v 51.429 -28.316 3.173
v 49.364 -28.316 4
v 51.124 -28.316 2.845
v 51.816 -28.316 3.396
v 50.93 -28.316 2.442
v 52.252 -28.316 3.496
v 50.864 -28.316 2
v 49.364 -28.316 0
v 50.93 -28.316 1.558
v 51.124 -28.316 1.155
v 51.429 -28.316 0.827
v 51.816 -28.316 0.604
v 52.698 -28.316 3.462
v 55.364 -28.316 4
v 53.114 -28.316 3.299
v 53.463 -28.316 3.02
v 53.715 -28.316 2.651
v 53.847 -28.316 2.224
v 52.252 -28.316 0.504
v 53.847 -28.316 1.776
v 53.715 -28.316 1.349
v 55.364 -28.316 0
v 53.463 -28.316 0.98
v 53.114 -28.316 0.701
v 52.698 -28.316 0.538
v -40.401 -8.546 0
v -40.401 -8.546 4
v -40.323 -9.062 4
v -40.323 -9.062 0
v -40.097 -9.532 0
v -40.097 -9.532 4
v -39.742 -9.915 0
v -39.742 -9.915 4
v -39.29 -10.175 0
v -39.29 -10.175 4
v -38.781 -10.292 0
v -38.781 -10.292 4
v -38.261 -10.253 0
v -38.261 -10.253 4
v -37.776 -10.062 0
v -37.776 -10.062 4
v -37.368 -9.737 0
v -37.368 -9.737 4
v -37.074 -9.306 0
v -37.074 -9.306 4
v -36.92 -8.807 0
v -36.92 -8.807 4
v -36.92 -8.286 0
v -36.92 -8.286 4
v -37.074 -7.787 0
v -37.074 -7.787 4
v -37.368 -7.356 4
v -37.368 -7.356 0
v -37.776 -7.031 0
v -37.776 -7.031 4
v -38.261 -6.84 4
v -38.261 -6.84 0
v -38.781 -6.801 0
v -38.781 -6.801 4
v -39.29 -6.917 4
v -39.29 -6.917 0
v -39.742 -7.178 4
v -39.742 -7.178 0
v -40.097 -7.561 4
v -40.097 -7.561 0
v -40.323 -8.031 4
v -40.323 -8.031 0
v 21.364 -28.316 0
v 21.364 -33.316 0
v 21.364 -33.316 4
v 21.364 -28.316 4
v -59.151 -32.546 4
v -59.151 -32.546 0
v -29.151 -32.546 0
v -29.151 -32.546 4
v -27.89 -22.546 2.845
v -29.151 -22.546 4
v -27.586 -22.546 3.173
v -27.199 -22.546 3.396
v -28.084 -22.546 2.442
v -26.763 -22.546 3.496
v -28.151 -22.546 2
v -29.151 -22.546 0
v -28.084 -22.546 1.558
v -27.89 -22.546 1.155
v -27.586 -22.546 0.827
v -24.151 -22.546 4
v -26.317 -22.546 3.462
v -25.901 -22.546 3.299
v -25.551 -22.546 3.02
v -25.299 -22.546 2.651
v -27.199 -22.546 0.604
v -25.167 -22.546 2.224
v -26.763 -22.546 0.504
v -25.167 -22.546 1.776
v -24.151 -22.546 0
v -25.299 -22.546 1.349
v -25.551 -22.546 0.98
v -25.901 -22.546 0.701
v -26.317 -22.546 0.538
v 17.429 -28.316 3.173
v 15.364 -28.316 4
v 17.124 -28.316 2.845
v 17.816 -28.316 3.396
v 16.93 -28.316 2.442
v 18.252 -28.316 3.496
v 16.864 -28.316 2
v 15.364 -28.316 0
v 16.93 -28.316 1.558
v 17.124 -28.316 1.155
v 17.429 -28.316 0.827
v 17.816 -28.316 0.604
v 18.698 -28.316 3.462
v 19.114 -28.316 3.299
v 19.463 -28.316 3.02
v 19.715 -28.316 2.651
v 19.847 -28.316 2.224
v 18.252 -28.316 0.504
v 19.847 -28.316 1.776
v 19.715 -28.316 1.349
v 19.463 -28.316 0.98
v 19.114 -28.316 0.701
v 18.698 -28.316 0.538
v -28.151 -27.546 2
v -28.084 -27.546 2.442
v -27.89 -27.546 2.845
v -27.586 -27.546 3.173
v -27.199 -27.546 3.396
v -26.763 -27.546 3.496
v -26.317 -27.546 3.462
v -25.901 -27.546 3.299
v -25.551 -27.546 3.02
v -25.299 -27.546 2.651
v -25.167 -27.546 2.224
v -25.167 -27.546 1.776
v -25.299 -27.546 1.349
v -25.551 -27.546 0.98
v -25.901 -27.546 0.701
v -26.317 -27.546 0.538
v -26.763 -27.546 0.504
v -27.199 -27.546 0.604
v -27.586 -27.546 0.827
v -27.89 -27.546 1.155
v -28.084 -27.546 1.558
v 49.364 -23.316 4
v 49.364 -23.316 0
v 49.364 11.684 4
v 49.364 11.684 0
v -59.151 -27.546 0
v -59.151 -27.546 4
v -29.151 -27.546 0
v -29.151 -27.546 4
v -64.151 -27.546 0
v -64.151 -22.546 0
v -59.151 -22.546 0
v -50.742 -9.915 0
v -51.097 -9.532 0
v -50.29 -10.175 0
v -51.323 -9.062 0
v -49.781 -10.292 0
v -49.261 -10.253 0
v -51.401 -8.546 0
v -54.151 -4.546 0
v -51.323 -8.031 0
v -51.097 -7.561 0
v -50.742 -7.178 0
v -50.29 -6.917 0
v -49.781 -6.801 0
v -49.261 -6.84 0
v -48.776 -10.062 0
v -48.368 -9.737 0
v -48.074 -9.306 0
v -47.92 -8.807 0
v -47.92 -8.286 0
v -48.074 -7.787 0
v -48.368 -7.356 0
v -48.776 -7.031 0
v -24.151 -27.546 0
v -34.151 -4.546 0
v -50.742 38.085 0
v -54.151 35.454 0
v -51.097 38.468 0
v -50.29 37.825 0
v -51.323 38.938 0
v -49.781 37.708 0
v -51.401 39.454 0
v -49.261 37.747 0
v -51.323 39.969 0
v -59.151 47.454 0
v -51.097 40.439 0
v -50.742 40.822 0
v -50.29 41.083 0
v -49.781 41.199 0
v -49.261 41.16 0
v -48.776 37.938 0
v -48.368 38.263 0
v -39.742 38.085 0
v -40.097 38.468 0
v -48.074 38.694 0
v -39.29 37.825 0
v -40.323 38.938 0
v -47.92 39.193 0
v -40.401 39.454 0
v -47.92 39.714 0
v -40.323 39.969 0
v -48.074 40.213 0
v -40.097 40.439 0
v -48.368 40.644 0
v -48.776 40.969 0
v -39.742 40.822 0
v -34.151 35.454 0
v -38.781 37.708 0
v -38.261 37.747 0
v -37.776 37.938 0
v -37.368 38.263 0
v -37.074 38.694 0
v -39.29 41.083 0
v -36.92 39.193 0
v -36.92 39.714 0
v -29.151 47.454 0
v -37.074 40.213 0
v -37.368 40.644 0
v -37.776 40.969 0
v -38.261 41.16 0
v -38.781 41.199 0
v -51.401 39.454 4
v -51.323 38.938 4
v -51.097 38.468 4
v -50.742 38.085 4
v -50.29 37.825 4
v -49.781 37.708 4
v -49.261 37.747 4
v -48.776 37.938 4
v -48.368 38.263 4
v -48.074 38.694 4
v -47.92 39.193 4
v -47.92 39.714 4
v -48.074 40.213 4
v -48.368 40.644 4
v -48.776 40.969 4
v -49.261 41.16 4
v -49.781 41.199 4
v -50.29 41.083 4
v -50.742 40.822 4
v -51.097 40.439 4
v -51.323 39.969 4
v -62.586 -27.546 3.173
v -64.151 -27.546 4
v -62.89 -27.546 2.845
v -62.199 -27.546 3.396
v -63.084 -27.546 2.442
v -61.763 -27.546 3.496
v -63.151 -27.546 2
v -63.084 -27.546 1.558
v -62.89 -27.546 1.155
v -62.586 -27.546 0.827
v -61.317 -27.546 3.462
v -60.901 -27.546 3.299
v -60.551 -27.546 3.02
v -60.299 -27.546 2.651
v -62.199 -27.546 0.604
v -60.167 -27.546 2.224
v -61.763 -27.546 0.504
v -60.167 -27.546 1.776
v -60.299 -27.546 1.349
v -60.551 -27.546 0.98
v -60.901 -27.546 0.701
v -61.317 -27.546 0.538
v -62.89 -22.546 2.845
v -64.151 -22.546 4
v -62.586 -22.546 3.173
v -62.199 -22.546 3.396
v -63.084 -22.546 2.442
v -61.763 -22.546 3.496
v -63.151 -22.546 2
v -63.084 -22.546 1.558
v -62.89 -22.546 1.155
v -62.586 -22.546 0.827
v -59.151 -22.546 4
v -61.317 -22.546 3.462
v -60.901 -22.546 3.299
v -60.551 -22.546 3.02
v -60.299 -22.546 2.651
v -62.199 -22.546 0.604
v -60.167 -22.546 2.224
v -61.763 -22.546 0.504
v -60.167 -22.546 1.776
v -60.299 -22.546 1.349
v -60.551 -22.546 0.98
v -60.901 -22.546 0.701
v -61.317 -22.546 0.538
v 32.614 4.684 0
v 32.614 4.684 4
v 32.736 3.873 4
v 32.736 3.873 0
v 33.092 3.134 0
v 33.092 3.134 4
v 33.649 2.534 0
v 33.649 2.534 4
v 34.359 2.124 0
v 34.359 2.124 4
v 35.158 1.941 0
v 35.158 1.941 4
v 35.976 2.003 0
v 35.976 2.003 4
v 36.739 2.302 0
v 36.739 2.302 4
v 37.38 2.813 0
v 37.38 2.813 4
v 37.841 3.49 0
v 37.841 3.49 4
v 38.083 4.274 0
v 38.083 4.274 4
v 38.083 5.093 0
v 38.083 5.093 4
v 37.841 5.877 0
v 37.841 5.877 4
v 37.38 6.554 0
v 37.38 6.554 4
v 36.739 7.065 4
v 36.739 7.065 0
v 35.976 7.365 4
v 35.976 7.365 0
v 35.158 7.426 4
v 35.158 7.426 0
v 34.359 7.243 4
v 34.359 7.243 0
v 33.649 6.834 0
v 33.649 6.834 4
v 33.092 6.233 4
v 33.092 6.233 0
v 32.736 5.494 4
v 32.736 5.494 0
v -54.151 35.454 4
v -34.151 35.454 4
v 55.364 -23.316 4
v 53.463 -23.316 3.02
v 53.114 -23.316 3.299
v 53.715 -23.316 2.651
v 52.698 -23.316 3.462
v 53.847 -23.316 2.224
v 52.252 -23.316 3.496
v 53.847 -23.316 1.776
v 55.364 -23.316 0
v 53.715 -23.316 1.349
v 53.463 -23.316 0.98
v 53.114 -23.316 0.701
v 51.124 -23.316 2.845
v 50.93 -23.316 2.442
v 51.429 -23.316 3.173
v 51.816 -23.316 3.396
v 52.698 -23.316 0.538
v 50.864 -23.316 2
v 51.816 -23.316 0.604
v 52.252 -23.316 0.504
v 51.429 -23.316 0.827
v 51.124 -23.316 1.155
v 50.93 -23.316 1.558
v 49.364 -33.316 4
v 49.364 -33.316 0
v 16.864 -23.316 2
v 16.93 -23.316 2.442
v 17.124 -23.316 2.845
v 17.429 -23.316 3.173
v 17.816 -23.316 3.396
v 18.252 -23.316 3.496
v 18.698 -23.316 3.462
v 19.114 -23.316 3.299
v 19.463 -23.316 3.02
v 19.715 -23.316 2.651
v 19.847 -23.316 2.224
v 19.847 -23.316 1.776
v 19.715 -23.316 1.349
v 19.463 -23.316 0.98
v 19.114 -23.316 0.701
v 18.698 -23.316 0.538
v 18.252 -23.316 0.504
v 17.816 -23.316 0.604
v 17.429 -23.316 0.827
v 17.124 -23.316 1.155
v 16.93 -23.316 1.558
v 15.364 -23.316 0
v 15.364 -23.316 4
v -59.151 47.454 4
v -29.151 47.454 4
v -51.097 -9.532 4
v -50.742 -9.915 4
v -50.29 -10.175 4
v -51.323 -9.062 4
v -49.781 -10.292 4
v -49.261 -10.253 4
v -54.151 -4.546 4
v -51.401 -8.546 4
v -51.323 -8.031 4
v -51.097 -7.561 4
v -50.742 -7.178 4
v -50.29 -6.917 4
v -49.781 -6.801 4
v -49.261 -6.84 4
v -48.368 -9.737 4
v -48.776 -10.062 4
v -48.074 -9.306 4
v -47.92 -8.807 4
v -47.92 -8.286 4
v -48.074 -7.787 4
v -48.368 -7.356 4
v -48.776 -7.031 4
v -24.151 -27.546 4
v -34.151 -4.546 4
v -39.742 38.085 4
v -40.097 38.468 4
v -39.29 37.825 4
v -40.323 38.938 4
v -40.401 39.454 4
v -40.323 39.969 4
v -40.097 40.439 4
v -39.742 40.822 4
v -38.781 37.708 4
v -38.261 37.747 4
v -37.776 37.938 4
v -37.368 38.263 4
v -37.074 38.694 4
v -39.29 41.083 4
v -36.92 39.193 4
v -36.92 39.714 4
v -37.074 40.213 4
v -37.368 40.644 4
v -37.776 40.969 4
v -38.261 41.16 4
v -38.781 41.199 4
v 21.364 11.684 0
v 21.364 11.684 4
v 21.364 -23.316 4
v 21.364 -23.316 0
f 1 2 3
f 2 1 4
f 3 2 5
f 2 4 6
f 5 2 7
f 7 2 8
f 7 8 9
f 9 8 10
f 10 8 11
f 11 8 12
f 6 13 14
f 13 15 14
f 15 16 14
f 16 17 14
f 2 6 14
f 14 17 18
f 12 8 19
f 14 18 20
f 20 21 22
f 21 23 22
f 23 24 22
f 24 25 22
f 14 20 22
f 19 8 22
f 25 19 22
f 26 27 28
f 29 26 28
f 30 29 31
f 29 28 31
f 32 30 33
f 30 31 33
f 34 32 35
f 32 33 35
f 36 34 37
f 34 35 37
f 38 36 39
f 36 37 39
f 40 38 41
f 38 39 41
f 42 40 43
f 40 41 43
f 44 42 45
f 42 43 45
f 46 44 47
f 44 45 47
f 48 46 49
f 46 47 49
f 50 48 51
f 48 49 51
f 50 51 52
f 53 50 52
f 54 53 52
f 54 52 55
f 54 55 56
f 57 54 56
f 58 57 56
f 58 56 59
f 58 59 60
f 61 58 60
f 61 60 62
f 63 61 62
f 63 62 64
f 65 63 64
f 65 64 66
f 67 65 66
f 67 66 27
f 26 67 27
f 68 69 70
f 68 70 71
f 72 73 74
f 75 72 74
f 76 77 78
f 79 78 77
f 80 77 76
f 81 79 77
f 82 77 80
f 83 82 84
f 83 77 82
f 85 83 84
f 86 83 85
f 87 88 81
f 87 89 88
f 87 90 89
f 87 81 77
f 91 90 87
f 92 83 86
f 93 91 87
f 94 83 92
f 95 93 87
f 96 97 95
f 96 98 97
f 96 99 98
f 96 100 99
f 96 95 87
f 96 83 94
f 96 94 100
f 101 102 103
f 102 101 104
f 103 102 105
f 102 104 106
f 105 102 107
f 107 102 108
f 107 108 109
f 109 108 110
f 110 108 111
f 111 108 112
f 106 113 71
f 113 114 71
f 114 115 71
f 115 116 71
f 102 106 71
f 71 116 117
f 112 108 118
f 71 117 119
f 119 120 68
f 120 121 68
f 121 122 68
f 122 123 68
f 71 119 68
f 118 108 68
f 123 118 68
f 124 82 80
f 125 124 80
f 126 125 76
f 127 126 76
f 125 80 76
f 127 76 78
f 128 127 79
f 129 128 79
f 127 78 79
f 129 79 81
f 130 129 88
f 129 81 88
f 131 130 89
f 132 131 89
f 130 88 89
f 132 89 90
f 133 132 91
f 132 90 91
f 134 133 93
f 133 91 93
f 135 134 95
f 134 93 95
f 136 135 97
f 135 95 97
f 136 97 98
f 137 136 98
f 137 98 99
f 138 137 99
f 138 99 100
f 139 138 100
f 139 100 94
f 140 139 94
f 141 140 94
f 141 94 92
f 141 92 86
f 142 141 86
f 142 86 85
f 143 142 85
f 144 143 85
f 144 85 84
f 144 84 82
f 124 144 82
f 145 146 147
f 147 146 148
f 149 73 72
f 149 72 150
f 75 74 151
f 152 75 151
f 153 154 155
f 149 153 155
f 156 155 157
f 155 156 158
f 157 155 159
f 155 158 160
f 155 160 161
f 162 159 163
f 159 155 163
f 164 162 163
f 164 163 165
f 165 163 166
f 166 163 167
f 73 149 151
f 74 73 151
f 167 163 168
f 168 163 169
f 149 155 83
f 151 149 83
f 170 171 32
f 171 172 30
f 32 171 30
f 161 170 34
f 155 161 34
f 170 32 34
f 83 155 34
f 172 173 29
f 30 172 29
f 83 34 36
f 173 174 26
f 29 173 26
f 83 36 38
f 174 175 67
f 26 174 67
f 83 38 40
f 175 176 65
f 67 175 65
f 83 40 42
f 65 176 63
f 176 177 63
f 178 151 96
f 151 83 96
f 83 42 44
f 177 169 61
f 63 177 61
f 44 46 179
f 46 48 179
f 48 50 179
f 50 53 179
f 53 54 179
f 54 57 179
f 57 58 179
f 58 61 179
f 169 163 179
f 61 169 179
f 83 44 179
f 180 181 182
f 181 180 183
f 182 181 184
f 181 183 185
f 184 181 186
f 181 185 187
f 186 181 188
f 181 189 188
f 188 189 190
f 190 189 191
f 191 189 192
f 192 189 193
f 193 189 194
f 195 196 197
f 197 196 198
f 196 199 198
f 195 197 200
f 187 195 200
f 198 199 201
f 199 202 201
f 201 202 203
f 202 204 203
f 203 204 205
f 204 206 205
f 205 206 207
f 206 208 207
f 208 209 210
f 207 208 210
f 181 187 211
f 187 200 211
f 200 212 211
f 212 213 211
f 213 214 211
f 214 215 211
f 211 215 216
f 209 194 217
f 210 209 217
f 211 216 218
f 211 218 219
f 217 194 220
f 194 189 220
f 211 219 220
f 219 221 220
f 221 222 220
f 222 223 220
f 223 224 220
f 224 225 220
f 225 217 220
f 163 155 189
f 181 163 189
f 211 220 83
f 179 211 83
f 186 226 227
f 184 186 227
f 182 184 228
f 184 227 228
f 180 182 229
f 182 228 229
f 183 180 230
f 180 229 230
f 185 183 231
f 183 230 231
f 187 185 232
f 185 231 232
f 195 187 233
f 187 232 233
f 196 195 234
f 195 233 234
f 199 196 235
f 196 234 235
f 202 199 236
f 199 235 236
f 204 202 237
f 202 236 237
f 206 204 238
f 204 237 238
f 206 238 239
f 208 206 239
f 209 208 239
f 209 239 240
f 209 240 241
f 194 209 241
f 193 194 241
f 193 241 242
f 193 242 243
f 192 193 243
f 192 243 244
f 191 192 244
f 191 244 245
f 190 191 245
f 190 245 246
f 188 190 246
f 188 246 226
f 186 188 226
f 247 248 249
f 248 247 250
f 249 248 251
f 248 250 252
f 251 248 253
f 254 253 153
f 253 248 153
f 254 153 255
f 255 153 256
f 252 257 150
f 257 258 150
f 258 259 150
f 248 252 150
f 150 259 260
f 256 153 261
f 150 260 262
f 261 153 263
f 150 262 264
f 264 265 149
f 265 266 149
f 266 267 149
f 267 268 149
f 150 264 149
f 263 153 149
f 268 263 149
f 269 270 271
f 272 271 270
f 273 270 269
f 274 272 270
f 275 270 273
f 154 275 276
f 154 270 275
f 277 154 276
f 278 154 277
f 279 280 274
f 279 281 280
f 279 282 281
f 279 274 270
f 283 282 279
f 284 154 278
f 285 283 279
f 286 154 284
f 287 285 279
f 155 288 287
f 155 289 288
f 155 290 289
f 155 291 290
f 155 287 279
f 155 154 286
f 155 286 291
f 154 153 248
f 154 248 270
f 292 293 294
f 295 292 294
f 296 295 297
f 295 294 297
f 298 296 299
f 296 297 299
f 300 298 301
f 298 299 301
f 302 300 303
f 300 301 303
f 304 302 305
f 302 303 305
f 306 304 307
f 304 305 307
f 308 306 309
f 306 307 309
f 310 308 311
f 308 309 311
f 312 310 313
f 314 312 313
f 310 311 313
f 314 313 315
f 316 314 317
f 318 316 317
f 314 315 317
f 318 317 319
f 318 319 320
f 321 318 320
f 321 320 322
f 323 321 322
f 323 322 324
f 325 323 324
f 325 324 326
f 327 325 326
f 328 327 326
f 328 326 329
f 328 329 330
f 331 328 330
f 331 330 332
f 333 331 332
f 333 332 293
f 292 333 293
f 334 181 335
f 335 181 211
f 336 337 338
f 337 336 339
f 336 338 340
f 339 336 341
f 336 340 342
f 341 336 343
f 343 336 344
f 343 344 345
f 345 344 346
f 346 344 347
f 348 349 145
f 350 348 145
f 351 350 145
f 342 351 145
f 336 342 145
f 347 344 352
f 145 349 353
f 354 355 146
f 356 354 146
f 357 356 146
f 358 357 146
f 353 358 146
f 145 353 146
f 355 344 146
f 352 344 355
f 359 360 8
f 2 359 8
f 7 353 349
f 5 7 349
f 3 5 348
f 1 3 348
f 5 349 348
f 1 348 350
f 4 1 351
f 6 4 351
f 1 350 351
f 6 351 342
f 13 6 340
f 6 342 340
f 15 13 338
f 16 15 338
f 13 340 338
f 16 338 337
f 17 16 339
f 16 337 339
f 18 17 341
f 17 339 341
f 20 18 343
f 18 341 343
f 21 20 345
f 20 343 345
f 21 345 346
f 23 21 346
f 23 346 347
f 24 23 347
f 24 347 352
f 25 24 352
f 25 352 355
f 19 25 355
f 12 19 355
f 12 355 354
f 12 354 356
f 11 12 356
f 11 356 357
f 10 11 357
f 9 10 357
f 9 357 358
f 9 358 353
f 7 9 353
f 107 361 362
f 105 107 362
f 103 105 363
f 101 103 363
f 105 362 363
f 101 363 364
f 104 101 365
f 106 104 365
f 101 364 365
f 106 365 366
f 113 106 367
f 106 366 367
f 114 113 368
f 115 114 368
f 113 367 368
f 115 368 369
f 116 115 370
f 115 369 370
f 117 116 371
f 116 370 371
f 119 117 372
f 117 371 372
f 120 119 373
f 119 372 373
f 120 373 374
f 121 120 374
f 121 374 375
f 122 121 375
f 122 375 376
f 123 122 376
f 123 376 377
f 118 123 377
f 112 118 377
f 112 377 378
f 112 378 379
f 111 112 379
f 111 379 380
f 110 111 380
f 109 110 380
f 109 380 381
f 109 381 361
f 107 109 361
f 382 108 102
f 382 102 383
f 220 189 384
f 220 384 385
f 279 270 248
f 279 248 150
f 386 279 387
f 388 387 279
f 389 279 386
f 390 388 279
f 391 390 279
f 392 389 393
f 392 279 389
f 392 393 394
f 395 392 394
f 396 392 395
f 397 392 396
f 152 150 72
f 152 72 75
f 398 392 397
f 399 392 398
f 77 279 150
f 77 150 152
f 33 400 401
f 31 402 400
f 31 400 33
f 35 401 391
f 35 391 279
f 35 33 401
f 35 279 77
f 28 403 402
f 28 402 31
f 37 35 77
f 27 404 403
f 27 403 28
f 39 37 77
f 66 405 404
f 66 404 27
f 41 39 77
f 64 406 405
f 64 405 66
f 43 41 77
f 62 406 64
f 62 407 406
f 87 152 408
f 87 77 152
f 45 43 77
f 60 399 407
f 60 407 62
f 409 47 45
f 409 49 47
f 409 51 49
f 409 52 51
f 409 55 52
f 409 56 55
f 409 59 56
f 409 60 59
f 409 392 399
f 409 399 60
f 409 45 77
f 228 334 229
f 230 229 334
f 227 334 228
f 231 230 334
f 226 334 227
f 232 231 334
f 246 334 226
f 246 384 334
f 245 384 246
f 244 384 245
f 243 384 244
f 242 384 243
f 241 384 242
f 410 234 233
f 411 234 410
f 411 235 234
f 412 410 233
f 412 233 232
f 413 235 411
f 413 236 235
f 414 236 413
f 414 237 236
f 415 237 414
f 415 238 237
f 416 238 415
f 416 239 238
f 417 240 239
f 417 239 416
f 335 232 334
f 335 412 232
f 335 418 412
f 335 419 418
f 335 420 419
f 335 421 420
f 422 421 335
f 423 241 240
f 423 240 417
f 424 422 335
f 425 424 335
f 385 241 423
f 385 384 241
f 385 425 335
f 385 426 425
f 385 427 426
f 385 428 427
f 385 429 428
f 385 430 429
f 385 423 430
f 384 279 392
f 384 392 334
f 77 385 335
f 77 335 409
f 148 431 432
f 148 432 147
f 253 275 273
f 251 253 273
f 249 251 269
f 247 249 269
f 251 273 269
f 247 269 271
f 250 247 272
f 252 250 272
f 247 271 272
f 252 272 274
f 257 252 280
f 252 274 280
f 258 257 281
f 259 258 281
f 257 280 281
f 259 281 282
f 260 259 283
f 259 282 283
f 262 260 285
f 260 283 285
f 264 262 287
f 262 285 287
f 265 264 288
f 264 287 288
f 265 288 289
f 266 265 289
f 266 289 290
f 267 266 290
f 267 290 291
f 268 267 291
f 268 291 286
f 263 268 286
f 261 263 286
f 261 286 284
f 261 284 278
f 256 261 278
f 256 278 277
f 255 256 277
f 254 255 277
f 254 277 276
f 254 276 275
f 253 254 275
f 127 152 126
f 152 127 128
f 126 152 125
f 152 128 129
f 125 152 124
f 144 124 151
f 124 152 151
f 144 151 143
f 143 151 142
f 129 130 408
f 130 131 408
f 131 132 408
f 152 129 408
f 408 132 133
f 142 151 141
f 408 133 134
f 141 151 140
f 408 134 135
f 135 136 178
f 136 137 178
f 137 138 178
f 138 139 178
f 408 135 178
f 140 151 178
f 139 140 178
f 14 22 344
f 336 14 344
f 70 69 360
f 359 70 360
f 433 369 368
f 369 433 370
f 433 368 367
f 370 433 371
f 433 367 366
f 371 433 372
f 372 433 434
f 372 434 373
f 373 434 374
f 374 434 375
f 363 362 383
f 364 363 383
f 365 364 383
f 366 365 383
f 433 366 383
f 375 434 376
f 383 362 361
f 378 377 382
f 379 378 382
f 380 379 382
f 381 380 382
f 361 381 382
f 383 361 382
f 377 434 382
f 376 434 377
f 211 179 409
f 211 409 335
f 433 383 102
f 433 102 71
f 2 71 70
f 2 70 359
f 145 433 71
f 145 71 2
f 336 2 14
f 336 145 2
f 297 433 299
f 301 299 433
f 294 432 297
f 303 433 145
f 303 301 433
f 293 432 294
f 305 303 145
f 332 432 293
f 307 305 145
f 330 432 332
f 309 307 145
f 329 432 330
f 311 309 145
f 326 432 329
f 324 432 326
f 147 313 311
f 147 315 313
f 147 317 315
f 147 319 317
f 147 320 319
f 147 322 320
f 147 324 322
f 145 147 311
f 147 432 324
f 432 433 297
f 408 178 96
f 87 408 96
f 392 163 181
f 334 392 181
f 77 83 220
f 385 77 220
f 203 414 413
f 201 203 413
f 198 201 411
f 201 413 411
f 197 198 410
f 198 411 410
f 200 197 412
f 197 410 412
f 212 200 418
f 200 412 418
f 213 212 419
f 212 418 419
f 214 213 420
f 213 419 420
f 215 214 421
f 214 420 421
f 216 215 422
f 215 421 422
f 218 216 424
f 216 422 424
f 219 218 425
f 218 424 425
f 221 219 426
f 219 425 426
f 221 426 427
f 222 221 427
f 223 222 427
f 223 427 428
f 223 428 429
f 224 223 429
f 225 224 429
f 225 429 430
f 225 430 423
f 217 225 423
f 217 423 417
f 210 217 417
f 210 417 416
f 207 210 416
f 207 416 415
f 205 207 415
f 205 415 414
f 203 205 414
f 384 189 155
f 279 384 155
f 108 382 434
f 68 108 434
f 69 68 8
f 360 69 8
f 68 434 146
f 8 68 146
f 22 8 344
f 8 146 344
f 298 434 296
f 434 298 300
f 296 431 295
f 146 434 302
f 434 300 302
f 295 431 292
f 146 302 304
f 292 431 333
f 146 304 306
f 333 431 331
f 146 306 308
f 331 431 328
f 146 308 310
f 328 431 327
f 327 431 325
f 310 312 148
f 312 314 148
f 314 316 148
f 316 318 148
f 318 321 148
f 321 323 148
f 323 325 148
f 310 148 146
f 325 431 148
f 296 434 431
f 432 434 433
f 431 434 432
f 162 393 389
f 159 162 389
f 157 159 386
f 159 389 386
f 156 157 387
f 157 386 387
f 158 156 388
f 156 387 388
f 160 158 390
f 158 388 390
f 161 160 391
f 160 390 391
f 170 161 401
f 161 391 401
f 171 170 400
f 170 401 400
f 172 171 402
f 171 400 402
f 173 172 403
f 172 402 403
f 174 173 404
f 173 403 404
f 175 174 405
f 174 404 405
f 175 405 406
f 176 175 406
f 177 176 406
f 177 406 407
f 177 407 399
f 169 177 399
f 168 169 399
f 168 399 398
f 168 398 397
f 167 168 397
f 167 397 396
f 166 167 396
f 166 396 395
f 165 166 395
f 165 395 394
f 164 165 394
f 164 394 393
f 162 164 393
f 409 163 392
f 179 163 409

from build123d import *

# Parameters (mm, degrees)
F0_W            = 30
F0_H            = 70
F0_W_2          = 20
F0_H_2          = 40
F0_H_3          = 5
F0_W_3          = 5
F1_DEPTH        = 4
F4_D            = 3
F4_DEPTH        = 20
F4_TIP          = 0.9012909285
F4_ON_F3_D      = 3
F4_ON_F3_DEPTH  = 20
F4_ON_F3_TIP    = 0.9012909285
F5_D            = 3.5
F6_W            = 28
F6_H            = 5
F6_W_2          = 6
F6_H_2          = 35
F7_DEPTH        = 4
F10_D           = 3
F10_DEPTH       = 20
F10_TIP         = 0.9012909285
F10_ON_F9_D     = 3
F10_ON_F9_DEPTH = 20
F10_ON_F9_TIP   = 0.9012909285
F11_D           = 5.5
F11_DEPTH       = 20
F11_TIP         = 1.6523667023


with BuildPart() as f1:
    # F0 (on Top) → F1 (new body)
    with BuildSketch(Plane.XY):
        with Locations((-44.1506063403, 12.4535401911)):
            Rectangle(F0_W, F0_H)
        with Locations((-44.1506063403, 15.4535401911)):
            Rectangle(F0_W_2, F0_H_2, mode=Mode.SUBTRACT)
        with Locations((-44.1506063403, -25.0464598089)):
            Rectangle(F0_W, F0_H_3)
        with Locations((-61.6506063403, -25.0464598089)):
            Rectangle(F0_W_3, F0_H_3)
        with Locations((-44.1506063403, -30.0464598089)):
            Rectangle(F0_W, F0_H_3)
        with Locations((-26.6506063403, -25.0464598089)):
            Rectangle(F0_W_3, F0_H_3)
    extrude(amount=F1_DEPTH)

    # F4
    with Locations(Plane.XZ.offset(27.5464598089)):
        with Locations((-61.6506063403, 2)):
            Hole(F4_D / 2, depth=F4_DEPTH)
            with Locations((0, 0, -(F4_DEPTH + F4_TIP / 2))):  # 118° drill point
                Cone(0, F4_D / 2, F4_TIP, mode=Mode.SUBTRACT)

    # F4 on F3
    with Locations(Plane.XZ.offset(27.5464598089)):
        with Locations((-26.6506063403, 2)):
            Hole(F4_ON_F3_D / 2, depth=F4_ON_F3_DEPTH)
            with Locations((0, 0, -(F4_ON_F3_DEPTH + F4_ON_F3_TIP / 2))):  # 118° drill point
                Cone(0, F4_ON_F3_D / 2, F4_ON_F3_TIP, mode=Mode.SUBTRACT)

    # F5 (through all)
    with Locations(Plane(origin=(0, 0, 0), x_dir=(1, 0, 0), z_dir=(0, 0, -1))):
        with Locations((-49.6506063403, -39.4535401911), (-38.6506063403, -39.4535401911), (-49.6506063403, 8.5464598089), (-38.6506063403, 8.5464598089)):
            Hole(F5_D / 2)


with BuildPart() as f7:
    # F6 (on Top) → F7 (new body)
    with BuildSketch(Plane.XY):
        with Locations((35.3638151288, -30.8164446056)):
            Rectangle(F6_W, F6_H)
        with Locations((18.3638151288, -25.8164446056)):
            Rectangle(F6_W_2, F6_H)
        with Locations((35.3638151288, -25.8164446056)):
            Rectangle(F6_W, F6_H)
        with Locations((52.3638151288, -25.8164446056)):
            Rectangle(F6_W_2, F6_H)
        with Locations((35.3638151288, -5.8164446056)):
            Rectangle(F6_W, F6_H_2)
    extrude(amount=F7_DEPTH)

    # F10
    with Locations(Plane.XZ.offset(28.3164446056)):
        with Locations((18.3638151288, 2)):
            Hole(F10_D / 2, depth=F10_DEPTH)
            with Locations((0, 0, -(F10_DEPTH + F10_TIP / 2))):  # 118° drill point
                Cone(0, F10_D / 2, F10_TIP, mode=Mode.SUBTRACT)

    # F10 on F9
    with Locations(Plane.XZ.offset(28.3164446056)):
        with Locations((52.3638151288, 2)):
            Hole(F10_ON_F9_D / 2, depth=F10_ON_F9_DEPTH)
            with Locations((0, 0, -(F10_ON_F9_DEPTH + F10_ON_F9_TIP / 2))):  # 118° drill point
                Cone(0, F10_ON_F9_D / 2, F10_ON_F9_TIP, mode=Mode.SUBTRACT)

    # F11
    with Locations(Plane(origin=(0, 0, 0), x_dir=(1, 0, 0), z_dir=(0, 0, -1))):
        with Locations((35.3638151288, -4.6835553944)):
            Hole(F11_D / 2, depth=F11_DEPTH)
            with Locations((0, 0, -(F11_DEPTH + F11_TIP / 2))):  # 118° drill point
                Cone(0, F11_D / 2, F11_TIP, mode=Mode.SUBTRACT)


solid = Compound([f1.part, f7.part])
